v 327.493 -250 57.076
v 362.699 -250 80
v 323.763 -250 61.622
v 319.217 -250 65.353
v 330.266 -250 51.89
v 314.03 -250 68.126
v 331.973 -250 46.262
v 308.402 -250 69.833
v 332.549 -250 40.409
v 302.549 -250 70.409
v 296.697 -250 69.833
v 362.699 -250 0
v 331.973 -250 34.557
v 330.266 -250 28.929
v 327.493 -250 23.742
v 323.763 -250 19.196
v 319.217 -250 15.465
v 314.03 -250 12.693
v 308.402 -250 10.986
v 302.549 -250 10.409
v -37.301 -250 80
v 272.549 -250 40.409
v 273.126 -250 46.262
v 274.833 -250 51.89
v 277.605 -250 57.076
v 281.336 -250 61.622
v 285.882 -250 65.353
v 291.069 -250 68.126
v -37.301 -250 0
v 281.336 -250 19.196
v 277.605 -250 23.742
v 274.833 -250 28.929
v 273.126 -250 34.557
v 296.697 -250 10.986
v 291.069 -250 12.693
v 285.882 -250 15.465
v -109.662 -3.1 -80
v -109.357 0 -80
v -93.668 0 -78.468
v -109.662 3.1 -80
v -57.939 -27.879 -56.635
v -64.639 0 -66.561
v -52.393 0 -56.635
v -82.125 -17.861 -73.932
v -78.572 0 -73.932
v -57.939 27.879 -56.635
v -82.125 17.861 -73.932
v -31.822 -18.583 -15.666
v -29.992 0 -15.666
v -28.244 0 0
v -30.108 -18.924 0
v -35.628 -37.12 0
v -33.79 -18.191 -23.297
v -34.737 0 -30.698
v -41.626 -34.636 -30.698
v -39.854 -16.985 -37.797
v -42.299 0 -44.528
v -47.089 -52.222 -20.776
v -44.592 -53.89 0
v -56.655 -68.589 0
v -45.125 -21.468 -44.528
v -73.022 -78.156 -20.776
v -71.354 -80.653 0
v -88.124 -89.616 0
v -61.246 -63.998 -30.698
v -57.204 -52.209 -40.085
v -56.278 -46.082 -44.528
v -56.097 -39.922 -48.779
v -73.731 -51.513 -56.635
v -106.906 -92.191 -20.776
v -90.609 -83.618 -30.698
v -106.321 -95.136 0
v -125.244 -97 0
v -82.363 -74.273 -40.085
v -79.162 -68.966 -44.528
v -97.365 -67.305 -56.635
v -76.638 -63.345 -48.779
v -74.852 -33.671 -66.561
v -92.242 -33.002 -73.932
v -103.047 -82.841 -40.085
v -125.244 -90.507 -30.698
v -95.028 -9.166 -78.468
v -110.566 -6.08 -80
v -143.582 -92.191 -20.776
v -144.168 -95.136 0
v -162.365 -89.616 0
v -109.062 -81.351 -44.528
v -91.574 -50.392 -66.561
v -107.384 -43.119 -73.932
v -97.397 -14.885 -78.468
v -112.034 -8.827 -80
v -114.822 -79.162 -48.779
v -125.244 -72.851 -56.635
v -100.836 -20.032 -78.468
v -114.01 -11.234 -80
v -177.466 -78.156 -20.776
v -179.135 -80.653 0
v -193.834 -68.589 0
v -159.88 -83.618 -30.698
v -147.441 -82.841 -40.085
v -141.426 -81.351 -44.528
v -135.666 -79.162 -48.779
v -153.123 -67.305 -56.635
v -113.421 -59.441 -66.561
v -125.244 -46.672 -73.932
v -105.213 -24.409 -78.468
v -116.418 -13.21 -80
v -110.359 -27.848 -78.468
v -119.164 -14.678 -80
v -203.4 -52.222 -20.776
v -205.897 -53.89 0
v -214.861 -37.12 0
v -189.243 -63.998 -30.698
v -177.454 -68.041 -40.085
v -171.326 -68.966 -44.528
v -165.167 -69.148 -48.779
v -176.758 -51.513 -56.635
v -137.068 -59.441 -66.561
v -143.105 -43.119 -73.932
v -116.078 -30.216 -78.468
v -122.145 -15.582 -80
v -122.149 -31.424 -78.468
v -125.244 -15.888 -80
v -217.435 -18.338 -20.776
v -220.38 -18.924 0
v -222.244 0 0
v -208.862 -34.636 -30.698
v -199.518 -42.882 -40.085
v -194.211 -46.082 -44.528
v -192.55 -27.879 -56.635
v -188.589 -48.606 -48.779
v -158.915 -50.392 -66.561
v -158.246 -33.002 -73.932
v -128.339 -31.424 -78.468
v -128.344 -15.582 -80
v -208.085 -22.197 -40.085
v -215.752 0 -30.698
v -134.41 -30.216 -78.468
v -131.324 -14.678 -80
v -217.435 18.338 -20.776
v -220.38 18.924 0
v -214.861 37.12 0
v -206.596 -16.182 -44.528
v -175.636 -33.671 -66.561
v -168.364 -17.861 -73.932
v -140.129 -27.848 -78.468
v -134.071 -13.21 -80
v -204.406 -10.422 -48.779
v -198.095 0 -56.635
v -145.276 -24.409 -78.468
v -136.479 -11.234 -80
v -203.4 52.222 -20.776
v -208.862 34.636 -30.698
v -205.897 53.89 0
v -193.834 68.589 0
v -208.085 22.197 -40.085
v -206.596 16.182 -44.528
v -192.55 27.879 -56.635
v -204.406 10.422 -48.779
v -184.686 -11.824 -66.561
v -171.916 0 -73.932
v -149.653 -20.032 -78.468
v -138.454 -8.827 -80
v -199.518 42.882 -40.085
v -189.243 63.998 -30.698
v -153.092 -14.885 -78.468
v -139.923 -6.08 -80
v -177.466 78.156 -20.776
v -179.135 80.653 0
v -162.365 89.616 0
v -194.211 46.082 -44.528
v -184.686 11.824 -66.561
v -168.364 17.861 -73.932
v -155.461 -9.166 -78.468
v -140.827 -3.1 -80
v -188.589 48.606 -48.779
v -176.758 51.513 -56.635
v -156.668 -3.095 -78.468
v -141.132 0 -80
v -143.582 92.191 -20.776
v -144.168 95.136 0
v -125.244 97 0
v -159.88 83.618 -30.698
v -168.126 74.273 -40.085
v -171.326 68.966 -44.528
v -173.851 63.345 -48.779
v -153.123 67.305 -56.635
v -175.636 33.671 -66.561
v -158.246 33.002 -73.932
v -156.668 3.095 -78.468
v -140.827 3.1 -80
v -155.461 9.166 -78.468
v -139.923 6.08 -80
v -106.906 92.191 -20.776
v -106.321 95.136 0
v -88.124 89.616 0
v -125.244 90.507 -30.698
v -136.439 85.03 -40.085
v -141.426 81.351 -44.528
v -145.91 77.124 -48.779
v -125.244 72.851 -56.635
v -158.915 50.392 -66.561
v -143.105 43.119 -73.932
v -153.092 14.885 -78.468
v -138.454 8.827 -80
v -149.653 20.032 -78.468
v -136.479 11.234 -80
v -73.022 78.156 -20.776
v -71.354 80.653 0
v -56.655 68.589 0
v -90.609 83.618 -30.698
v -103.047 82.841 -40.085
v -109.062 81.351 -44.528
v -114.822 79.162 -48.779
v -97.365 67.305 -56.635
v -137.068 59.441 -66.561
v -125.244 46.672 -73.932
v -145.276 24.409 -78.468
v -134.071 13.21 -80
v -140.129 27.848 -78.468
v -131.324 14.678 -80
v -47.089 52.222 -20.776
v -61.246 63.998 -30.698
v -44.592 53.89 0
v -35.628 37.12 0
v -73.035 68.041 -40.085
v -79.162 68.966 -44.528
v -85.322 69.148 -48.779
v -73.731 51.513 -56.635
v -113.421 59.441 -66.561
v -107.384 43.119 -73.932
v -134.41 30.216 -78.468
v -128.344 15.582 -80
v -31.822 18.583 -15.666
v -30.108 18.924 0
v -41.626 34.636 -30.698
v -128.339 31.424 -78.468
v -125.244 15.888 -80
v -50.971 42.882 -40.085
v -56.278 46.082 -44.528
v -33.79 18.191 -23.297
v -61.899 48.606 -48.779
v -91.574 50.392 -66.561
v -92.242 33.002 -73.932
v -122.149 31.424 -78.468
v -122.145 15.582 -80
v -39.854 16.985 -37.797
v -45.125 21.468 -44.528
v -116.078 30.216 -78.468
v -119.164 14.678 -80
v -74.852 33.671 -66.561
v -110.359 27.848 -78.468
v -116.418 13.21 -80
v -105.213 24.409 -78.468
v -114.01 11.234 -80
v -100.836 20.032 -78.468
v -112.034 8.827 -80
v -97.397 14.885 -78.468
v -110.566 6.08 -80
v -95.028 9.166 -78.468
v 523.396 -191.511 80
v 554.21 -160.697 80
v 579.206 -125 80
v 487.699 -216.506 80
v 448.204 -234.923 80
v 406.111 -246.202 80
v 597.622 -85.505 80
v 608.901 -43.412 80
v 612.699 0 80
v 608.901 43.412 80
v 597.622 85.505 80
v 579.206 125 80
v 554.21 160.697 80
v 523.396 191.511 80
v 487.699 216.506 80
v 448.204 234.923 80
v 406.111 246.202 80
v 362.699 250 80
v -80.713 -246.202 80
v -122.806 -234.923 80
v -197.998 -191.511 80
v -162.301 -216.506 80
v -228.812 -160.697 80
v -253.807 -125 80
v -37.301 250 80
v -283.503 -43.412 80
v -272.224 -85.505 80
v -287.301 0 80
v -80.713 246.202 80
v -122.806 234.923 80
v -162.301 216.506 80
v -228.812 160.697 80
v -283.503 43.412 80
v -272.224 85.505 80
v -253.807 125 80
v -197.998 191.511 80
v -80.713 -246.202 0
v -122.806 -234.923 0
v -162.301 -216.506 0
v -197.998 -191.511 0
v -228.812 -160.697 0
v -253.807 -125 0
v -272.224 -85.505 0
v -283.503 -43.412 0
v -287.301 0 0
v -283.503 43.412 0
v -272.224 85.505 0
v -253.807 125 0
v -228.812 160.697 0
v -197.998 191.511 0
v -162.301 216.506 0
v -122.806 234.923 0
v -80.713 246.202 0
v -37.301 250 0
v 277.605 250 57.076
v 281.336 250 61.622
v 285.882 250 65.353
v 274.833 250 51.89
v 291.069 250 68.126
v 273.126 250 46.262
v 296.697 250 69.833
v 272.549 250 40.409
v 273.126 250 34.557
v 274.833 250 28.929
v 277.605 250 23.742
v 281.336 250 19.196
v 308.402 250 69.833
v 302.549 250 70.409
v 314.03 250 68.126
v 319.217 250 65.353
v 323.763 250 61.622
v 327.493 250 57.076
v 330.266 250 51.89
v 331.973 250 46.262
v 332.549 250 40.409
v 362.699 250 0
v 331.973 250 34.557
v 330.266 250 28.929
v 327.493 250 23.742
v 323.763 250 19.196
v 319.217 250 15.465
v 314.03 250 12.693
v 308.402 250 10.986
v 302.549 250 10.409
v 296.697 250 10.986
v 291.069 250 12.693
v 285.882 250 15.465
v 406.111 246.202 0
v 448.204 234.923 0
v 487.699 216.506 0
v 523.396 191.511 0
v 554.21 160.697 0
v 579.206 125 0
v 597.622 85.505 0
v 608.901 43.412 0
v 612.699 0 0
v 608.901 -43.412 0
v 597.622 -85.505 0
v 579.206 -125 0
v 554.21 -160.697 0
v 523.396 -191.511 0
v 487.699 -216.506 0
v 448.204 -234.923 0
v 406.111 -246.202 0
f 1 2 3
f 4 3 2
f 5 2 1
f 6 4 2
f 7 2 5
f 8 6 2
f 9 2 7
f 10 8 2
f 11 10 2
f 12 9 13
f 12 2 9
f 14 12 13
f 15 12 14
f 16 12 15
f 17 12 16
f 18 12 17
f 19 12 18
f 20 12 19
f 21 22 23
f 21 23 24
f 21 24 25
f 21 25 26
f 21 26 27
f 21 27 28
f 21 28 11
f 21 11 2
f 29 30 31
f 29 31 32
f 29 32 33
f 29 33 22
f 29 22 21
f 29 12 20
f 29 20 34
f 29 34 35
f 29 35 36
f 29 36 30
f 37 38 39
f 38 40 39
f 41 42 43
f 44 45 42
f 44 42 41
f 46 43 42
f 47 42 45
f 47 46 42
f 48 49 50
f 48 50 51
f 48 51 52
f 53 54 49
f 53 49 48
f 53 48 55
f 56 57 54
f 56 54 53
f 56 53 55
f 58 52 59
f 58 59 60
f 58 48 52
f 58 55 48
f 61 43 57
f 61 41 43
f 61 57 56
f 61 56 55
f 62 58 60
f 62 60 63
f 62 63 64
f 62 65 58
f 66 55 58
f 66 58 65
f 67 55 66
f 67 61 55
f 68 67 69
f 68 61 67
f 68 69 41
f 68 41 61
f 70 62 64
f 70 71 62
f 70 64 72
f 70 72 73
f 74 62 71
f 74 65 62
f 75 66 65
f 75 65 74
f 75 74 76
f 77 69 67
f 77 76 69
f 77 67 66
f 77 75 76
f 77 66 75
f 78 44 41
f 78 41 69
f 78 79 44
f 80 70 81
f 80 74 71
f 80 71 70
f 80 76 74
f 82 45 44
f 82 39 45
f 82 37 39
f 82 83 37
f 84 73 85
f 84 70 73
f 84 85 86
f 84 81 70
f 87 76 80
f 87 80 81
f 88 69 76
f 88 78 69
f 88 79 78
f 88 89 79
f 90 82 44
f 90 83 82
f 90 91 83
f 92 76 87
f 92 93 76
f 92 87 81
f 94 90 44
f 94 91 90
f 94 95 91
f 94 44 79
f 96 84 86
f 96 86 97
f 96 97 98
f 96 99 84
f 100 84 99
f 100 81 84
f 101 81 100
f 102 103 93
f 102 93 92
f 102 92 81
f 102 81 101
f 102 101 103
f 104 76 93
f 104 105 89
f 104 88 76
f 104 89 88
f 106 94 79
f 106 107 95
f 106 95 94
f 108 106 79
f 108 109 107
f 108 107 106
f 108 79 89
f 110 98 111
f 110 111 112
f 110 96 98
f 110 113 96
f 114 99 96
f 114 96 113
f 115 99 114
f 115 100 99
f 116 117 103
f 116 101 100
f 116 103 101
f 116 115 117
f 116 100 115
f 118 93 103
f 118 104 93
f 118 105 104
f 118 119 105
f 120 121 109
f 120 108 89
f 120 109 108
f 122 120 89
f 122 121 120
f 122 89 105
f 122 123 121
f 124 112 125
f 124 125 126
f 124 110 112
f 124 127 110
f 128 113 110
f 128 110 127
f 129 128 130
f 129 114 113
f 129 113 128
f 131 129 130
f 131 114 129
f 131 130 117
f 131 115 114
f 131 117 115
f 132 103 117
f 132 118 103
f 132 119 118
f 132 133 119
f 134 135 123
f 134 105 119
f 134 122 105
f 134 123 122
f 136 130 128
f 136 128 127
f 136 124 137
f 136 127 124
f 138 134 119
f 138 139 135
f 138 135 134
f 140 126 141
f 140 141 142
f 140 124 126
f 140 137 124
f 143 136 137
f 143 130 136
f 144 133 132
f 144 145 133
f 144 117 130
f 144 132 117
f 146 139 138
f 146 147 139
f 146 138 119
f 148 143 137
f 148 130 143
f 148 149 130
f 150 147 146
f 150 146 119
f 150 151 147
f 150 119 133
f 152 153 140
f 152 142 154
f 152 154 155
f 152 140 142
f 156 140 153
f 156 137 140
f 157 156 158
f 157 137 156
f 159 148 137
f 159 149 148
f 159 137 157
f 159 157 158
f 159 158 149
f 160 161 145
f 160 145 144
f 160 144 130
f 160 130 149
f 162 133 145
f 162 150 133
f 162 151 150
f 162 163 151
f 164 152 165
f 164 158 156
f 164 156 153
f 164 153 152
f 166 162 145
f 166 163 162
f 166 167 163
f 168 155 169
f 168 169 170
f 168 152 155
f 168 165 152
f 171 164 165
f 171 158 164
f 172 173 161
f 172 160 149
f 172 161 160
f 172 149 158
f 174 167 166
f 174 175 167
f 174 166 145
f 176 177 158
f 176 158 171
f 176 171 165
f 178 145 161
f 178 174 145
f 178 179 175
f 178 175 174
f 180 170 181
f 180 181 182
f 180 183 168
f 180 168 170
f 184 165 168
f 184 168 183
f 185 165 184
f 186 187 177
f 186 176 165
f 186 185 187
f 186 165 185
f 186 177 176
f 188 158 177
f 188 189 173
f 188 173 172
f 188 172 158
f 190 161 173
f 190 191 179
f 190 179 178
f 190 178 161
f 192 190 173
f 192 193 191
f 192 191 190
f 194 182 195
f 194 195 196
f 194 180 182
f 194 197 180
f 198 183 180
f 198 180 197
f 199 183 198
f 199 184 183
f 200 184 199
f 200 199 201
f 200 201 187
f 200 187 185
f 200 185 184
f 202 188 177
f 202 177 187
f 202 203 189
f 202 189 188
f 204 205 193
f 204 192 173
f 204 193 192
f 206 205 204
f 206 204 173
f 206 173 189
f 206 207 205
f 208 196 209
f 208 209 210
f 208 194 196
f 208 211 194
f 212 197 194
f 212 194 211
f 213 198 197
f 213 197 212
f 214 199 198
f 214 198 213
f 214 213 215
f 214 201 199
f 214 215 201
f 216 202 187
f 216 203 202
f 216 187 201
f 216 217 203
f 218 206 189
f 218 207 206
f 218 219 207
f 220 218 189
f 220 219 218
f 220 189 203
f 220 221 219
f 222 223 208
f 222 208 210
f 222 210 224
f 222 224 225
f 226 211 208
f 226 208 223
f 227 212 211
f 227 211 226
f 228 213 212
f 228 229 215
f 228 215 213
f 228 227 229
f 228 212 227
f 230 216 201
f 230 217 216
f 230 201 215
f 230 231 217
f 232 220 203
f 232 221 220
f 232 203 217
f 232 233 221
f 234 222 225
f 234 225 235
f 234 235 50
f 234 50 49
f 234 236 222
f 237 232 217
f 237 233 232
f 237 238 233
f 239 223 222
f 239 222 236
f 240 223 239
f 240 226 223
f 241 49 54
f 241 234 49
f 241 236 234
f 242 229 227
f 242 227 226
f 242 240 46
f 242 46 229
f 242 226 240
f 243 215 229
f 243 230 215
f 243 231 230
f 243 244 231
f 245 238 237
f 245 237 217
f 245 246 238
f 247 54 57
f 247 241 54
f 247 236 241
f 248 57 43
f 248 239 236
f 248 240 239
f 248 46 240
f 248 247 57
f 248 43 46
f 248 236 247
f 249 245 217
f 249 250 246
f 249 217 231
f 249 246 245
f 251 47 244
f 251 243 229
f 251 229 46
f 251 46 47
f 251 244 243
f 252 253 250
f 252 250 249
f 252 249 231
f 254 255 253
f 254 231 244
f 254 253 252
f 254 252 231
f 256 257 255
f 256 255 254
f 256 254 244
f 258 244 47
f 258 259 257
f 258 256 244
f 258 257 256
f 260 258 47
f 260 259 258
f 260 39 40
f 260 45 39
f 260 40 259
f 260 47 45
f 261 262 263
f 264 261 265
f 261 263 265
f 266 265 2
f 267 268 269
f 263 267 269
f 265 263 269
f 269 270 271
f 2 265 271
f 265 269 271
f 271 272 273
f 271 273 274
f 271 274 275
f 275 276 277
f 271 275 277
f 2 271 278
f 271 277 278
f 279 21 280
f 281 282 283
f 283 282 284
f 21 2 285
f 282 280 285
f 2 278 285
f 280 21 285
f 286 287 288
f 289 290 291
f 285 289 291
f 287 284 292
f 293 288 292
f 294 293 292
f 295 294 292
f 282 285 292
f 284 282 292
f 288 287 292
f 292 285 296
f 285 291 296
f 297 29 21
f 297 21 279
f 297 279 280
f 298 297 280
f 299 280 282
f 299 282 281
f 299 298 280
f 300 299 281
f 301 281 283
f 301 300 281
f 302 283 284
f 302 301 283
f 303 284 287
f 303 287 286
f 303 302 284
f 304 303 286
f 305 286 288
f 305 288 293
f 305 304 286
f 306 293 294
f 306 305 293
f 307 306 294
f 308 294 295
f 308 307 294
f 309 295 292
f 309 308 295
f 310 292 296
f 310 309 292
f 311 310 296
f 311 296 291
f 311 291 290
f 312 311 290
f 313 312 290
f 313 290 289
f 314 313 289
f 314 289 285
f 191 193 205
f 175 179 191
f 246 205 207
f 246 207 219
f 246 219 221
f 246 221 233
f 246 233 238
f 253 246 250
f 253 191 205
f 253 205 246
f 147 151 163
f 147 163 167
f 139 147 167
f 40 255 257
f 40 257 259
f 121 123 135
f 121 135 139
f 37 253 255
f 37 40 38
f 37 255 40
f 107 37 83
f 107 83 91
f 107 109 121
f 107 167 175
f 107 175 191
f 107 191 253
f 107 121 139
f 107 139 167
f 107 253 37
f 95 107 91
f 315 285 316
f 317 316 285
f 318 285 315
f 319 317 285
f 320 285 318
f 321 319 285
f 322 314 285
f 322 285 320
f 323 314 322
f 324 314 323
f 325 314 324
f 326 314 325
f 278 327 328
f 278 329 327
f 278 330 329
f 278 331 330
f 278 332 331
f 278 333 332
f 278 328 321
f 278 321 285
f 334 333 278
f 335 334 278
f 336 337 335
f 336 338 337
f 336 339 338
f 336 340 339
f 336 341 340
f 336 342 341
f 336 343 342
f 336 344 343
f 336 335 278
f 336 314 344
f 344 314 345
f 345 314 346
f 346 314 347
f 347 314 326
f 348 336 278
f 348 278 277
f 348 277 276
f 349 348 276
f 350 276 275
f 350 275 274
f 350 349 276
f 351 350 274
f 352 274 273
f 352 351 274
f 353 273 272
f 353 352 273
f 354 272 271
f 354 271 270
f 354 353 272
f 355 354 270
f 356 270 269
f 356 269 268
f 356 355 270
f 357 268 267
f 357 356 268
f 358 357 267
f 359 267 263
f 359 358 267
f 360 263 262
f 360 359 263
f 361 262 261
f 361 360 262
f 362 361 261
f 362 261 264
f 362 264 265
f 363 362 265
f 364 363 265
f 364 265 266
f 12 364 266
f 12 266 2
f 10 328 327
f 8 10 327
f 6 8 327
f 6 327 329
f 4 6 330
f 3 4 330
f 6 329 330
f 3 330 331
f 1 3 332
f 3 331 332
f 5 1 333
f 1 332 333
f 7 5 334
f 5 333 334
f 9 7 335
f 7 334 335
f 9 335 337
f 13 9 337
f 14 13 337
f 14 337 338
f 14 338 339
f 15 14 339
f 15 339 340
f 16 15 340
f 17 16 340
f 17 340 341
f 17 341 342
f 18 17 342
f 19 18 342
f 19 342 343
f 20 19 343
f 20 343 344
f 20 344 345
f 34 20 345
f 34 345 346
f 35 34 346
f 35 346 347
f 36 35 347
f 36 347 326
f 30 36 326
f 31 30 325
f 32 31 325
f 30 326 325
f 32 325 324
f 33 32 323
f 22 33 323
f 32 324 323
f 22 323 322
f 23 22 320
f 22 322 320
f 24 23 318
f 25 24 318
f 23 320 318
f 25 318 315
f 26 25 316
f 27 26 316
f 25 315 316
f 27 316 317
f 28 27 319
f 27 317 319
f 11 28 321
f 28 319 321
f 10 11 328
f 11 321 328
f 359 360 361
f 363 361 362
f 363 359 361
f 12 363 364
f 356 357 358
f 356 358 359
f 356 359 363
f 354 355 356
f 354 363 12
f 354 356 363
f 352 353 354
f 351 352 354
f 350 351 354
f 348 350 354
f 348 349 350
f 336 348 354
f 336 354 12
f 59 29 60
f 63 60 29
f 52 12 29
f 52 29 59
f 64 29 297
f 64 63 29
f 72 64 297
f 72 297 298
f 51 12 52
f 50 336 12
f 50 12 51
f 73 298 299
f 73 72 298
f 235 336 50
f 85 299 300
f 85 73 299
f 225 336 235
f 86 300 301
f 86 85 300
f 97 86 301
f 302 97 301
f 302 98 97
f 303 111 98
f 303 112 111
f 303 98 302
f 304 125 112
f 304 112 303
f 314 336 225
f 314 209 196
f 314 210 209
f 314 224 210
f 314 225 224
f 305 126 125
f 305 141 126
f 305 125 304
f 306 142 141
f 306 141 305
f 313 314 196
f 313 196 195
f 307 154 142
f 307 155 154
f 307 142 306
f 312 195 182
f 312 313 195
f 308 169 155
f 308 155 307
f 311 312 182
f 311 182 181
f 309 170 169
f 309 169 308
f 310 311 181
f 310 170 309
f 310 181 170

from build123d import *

# Parameters (mm, degrees)
BOSS_EXTRUDE1_DEPTH = 80
SKETCH2_R           = 30
CUT_EXTRUDE1_DEPTH  = 795.858645519
SKETCH4_R           = 97
BOSS_EXTRUDE3_DEPTH = 80
FILLET1_R           = 81.12


with BuildPart() as part:
    # Sketch1 → Boss-Extrude1 (new body)
    with BuildSketch(Plane.XY):
        with BuildLine():
            Line((-37.300835355, 250), (362.699164645, 250))
            ThreePointArc((362.699164645, 250), (612.699164645, 0), (362.699164645, -250))
            Line((362.699164645, -250), (-37.300835355, -250))
            ThreePointArc((-37.300835355, -250), (-287.300835355, 0), (-37.300835355, 250))
        make_face()
    extrude(amount=BOSS_EXTRUDE1_DEPTH)

    # Sketch2 → Cut-Extrude1 (cut, through all)
    with BuildSketch(Plane(origin=(0, 250, 0), x_dir=(1, 0, 0), z_dir=(0, 1, 0))):
        with Locations(Location((302.549396618, -40.40928544, 0), (0, 0, 270))):
            Circle(SKETCH2_R)
    extrude(amount=-CUT_EXTRUDE1_DEPTH, mode=Mode.SUBTRACT)

    # Sketch4 → Boss-Extrude3 (add)
    with BuildSketch(Plane(origin=(0, 0, 0), x_dir=(-1, 0, 0), z_dir=(0, 0, -1))):
        with Locations(Location((125.244285171, 0, 0), (0, 0, 180))):
            Circle(SKETCH4_R)
    extrude(amount=BOSS_EXTRUDE3_DEPTH)

    # Fillet1
    # the kernel refuses this fillet: 81.12 mm, written as the material it takes off along each edge
    with BuildSketch(Plane(origin=(-125.244285171, 0, -80), x_dir=(1, 0, 0), z_dir=(0, 1, 0))) as fillet1_piece_1:
        with BuildLine():
            CenterArc((15.887732124, -81.12), FILLET1_R, 0.791091124, 89.208908876)
            Line((15.887732124, 0), (15.887732124, 1.6224))
            Line((15.887732124, 1.6224), (97, 1.6224))
            Line((97, 1.6224), (98.6224, 0))
            ThreePointArc((98.6224, 0), (98.6224, -40), (98.622245358, -79.9776))
            Line((98.622245358, -79.9776), (97, -80))
        make_face()
    revolve(axis=Axis((-125.244285171, 0, -80), (0, 0, -1)), mode=Mode.SUBTRACT)


solid = part.part
